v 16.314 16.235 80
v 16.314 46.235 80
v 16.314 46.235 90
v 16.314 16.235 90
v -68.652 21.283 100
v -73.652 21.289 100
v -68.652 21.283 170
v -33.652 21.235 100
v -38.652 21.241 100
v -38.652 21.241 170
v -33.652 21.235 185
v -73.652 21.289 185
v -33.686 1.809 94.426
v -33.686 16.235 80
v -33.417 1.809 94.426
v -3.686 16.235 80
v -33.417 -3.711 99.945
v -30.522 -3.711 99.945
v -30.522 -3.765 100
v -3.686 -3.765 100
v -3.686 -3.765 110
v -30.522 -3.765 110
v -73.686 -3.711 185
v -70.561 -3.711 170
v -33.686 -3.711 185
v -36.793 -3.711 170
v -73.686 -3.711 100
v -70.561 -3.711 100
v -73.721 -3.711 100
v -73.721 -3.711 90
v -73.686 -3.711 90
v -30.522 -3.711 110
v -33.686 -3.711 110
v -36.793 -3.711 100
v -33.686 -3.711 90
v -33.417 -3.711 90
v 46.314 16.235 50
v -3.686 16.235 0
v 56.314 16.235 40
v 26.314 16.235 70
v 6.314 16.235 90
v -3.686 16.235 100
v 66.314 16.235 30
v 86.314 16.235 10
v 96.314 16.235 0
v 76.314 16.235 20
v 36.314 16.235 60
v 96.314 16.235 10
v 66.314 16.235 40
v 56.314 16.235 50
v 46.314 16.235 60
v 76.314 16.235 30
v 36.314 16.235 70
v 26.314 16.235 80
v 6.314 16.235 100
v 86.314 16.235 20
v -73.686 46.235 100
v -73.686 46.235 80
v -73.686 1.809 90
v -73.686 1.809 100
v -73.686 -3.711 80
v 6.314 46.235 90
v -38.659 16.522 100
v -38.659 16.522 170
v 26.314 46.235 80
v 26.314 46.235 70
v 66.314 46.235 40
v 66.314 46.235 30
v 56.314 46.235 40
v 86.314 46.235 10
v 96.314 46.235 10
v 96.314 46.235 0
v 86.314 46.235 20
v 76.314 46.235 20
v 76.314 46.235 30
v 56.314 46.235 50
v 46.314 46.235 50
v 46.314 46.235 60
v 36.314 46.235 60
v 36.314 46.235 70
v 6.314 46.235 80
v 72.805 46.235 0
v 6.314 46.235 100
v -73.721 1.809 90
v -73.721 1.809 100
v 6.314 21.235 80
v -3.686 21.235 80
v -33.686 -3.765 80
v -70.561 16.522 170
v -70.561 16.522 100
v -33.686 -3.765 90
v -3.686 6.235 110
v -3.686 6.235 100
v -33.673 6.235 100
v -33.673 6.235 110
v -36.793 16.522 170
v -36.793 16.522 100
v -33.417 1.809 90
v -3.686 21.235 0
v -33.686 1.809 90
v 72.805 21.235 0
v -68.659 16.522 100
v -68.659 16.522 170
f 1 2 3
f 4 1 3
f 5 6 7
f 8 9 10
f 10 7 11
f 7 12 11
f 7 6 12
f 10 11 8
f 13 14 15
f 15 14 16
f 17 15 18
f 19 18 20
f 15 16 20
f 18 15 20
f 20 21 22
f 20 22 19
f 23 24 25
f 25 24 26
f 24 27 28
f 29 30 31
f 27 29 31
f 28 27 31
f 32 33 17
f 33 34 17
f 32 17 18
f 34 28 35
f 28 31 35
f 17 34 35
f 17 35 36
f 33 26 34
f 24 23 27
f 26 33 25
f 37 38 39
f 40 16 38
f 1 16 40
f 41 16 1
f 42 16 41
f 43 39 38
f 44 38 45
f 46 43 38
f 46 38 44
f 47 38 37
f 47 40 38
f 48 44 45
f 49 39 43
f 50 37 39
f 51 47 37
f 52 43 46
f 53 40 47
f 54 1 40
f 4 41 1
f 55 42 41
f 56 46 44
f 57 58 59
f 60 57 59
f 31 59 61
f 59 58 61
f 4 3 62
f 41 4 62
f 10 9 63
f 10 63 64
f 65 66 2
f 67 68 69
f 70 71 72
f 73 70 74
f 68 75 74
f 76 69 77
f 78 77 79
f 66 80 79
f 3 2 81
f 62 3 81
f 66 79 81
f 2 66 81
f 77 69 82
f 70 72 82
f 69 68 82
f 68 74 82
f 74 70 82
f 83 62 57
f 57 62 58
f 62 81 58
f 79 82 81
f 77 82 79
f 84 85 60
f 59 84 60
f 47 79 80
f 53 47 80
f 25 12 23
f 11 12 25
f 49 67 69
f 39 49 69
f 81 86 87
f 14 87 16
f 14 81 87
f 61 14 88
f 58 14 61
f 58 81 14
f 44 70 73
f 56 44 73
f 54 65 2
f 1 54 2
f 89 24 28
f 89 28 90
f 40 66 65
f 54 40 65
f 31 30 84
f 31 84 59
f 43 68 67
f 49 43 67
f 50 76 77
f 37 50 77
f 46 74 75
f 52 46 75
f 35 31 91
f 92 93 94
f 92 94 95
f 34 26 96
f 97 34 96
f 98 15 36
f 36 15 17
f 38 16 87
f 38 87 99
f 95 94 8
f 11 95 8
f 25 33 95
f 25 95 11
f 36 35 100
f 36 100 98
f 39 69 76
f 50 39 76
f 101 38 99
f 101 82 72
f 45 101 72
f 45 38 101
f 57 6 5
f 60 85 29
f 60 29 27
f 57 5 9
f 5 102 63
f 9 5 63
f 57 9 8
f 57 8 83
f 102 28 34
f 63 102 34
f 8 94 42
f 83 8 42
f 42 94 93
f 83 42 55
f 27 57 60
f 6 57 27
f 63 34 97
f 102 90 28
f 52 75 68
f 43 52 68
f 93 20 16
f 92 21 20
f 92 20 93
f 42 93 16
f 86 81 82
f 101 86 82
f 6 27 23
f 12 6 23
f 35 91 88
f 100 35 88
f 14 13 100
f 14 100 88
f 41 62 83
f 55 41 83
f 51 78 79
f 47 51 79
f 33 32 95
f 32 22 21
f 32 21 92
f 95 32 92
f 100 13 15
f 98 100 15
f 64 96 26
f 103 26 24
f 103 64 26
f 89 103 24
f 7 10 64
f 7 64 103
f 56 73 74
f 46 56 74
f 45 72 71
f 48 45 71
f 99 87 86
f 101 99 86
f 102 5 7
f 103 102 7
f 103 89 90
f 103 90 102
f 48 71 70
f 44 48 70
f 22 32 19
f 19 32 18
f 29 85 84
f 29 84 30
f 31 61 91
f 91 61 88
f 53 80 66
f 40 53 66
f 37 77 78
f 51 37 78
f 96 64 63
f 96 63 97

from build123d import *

# Parameters (mm, degrees)
F0_W      = 30
F0_H      = 20
F1_DEPTH  = 100
F2_W      = 80
F2_H      = 80
F3_DEPTH  = 60
F4_W      = 10
F4_H      = 10
F5_DEPTH  = 40
F7_DEPTH  = 30
F9_DEPTH  = 30
F10_W     = 10
F10_H     = 10
F11_DEPTH = 30
F12_W     = 40
F12_H     = 85
F13_DEPTH = 25
F15_W     = 33.7672308087
F15_H     = 41.9678427279
F16_DEPTH = 85
F14_W     = 30
F14_H     = 70
F17_DEPTH = 10
F18_W     = 33.7672308087
F18_H     = 41.9678427279
F19_DEPTH = 15
F20_W     = 40.303826414
F20_H     = 30.5195645853
F21_DEPTH = 10
F22_W     = 47.274120152
F22_H     = 29.6948088799
F23_DEPTH = 100
F25_DEPTH = 30
F27_DEPTH = 5


with BuildPart() as f1:
    # F0 (on Top) → F1 (new body)
    with BuildSketch(Plane.XY):
        Polygon((-33.6863899055, 46.2346871942), (-73.6863899055, 46.2346871942), (-73.6863899055, 16.2346871942), (-73.6863899055, -3.7106291857), (-33.6863899055, -3.7653128058), (-33.6863899055, 16.2346871942), align=None)
        Polygon((106.3136100945, 46.2346871942), (-33.6863899055, 46.2346871942), (-33.6863899055, 16.2346871942), (-3.6863899055, 16.2346871942), (106.3136100945, 16.2346871942), align=None)
        with Locations((-18.6863899055, 6.2346871942)):
            Rectangle(F0_W, F0_H)
    extrude(amount=F1_DEPTH)

    # F2 (on face) → F3 (cut)
    with BuildSketch(Plane(origin=(0, 46.2346871942, 0), x_dir=(-1, 0, 0), z_dir=(0, 1, 0))):
        Polygon((-106.3136100945, 100), (-106.3136100945, 0), (-6.3136100945, 100), align=None)
        with Locations((33.6863899055, 40)):
            Rectangle(F2_W, F2_H)
    extrude(amount=-F3_DEPTH, mode=Mode.SUBTRACT)

    # F4 (on face) → F5 (cut)
    with BuildSketch(Plane(origin=(0, 46.2346871942, 0), x_dir=(-1, 0, 0), z_dir=(0, 1, 0))):
        with Locations((-11.3136100945, 95)):
            Rectangle(F4_W, F4_H)
        with Locations((-101.3136100945, 5)):
            Rectangle(F4_W, F4_H)
        with Locations((-91.3136100945, 15)):
            Rectangle(F4_W, F4_H)
        with Locations((-81.3136100945, 25)):
            Rectangle(F4_W, F4_H)
        with Locations((-71.3136100945, 35)):
            Rectangle(F4_W, F4_H)
        with Locations((-61.3136100945, 45)):
            Rectangle(F4_W, F4_H)
        with Locations((-51.3136100945, 55)):
            Rectangle(F4_W, F4_H)
        with Locations((-41.3136100945, 65)):
            Rectangle(F4_W, F4_H)
        with Locations((-31.3136100945, 75)):
            Rectangle(F4_W, F4_H)
        with Locations((-21.3136100945, 85)):
            Rectangle(F4_W, F4_H)
    extrude(amount=-F5_DEPTH, mode=Mode.SUBTRACT)

    # F6 (on face) → F7 (cut)
    with BuildSketch(Plane.YZ.offset(-3.6863899055)):
        Polygon((16.2346871942, 80), (-3.7653128058, 100), (-3.7653128058, 80), align=None)
    extrude(amount=-F7_DEPTH, mode=Mode.SUBTRACT)

    # F8 (on face) → F9 (join)
    with BuildSketch(Plane.YZ.offset(-3.6863899055)):
        Polygon((-3.7653128058, 120), (-3.7653128058, 100), (16.2346871942, 100), align=None)
    extrude(amount=-F9_DEPTH)

    # F10 (on face) → F11 (cut)
    with BuildSketch(Plane.YZ.offset(-3.6863899055)):
        with Locations((11.2346871942, 105)):
            Rectangle(F10_W, F10_H)
        with Locations((1.2346871942, 115)):
            Rectangle(F10_W, F10_H)
    extrude(amount=-F11_DEPTH, mode=Mode.SUBTRACT)

    # F12 (on face) → F13 (join, symmetric)
    with BuildSketch(Plane(origin=(-0.0052104714, -3.8113580263, 0), x_dir=(0.9999990655, -0.0013670892, 0), z_dir=(-0.0013670892, -0.9999990655, 0))):
        with Locations((-53.6812109081, 142.5)):
            Rectangle(F12_W, F12_H)
    extrude(amount=F13_DEPTH, both=True)

    # F15 (on face) → F16 (cut)
    with BuildSketch(Plane.XY.offset(185)):
        with Locations((-53.6770410836, -4.4620987028)):
            Rectangle(F15_W, F15_H)
    extrude(amount=-F16_DEPTH, mode=Mode.SUBTRACT)

    # F14 (on face) → F17 (cut)
    with BuildSketch(Plane(origin=(0.0289667593, 21.188618612, 0), x_dir=(-0.9999990655, 0.0013670892, 0), z_dir=(0.0013670892, 0.9999990655, 0))):
        with Locations((53.6812109081, 135)):
            Rectangle(F14_W, F14_H)
    extrude(amount=-F17_DEPTH, mode=Mode.SUBTRACT)

    # F18 (on face) → F19 (join)
    with BuildSketch(Plane.XY.offset(185)):
        with Locations((-53.6770410836, -4.4620987028)):
            Rectangle(F18_W, F18_H)
    extrude(amount=-F19_DEPTH)

    # F20 (on face) → F21 (join)
    with BuildSketch(Plane(origin=(0, 0, 100), x_dir=(1, 0, 0), z_dir=(0, 0, -1))):
        with Locations((-53.5686165504, 13.4508235825)):
            Rectangle(F20_W, F20_H)
    extrude(amount=F21_DEPTH)

    # F22 (on face) → F23 (cut)
    with BuildSketch(Plane(origin=(0, 0, 90), x_dir=(1, 0, 0), z_dir=(0, 0, -1))):
        with Locations((-54.1594289243, 18.5580336256)):
            Rectangle(F22_W, F22_H)
    extrude(amount=-F23_DEPTH, mode=Mode.SUBTRACT)

    # F24 (on face) → F25 (cut)
    with BuildSketch(Plane(origin=(0, 46.2346871942, 0), x_dir=(-1, 0, 0), z_dir=(0, 1, 0))):
        Polygon((-72.805352509, 0), (-6.3136100945, 0), (-6.3136100945, 80), align=None)
    extrude(amount=-F25_DEPTH, mode=Mode.SUBTRACT)

    # F26 (on face) → F27 (join)
    with BuildSketch(Plane.XZ.offset(-16.2346871942)):
        Polygon((-3.6863899055, 80), (-3.6863899055, 0), (72.805352509, 0), (6.3136100945, 80), align=None)
    extrude(amount=-F27_DEPTH)


solid = f1.part
